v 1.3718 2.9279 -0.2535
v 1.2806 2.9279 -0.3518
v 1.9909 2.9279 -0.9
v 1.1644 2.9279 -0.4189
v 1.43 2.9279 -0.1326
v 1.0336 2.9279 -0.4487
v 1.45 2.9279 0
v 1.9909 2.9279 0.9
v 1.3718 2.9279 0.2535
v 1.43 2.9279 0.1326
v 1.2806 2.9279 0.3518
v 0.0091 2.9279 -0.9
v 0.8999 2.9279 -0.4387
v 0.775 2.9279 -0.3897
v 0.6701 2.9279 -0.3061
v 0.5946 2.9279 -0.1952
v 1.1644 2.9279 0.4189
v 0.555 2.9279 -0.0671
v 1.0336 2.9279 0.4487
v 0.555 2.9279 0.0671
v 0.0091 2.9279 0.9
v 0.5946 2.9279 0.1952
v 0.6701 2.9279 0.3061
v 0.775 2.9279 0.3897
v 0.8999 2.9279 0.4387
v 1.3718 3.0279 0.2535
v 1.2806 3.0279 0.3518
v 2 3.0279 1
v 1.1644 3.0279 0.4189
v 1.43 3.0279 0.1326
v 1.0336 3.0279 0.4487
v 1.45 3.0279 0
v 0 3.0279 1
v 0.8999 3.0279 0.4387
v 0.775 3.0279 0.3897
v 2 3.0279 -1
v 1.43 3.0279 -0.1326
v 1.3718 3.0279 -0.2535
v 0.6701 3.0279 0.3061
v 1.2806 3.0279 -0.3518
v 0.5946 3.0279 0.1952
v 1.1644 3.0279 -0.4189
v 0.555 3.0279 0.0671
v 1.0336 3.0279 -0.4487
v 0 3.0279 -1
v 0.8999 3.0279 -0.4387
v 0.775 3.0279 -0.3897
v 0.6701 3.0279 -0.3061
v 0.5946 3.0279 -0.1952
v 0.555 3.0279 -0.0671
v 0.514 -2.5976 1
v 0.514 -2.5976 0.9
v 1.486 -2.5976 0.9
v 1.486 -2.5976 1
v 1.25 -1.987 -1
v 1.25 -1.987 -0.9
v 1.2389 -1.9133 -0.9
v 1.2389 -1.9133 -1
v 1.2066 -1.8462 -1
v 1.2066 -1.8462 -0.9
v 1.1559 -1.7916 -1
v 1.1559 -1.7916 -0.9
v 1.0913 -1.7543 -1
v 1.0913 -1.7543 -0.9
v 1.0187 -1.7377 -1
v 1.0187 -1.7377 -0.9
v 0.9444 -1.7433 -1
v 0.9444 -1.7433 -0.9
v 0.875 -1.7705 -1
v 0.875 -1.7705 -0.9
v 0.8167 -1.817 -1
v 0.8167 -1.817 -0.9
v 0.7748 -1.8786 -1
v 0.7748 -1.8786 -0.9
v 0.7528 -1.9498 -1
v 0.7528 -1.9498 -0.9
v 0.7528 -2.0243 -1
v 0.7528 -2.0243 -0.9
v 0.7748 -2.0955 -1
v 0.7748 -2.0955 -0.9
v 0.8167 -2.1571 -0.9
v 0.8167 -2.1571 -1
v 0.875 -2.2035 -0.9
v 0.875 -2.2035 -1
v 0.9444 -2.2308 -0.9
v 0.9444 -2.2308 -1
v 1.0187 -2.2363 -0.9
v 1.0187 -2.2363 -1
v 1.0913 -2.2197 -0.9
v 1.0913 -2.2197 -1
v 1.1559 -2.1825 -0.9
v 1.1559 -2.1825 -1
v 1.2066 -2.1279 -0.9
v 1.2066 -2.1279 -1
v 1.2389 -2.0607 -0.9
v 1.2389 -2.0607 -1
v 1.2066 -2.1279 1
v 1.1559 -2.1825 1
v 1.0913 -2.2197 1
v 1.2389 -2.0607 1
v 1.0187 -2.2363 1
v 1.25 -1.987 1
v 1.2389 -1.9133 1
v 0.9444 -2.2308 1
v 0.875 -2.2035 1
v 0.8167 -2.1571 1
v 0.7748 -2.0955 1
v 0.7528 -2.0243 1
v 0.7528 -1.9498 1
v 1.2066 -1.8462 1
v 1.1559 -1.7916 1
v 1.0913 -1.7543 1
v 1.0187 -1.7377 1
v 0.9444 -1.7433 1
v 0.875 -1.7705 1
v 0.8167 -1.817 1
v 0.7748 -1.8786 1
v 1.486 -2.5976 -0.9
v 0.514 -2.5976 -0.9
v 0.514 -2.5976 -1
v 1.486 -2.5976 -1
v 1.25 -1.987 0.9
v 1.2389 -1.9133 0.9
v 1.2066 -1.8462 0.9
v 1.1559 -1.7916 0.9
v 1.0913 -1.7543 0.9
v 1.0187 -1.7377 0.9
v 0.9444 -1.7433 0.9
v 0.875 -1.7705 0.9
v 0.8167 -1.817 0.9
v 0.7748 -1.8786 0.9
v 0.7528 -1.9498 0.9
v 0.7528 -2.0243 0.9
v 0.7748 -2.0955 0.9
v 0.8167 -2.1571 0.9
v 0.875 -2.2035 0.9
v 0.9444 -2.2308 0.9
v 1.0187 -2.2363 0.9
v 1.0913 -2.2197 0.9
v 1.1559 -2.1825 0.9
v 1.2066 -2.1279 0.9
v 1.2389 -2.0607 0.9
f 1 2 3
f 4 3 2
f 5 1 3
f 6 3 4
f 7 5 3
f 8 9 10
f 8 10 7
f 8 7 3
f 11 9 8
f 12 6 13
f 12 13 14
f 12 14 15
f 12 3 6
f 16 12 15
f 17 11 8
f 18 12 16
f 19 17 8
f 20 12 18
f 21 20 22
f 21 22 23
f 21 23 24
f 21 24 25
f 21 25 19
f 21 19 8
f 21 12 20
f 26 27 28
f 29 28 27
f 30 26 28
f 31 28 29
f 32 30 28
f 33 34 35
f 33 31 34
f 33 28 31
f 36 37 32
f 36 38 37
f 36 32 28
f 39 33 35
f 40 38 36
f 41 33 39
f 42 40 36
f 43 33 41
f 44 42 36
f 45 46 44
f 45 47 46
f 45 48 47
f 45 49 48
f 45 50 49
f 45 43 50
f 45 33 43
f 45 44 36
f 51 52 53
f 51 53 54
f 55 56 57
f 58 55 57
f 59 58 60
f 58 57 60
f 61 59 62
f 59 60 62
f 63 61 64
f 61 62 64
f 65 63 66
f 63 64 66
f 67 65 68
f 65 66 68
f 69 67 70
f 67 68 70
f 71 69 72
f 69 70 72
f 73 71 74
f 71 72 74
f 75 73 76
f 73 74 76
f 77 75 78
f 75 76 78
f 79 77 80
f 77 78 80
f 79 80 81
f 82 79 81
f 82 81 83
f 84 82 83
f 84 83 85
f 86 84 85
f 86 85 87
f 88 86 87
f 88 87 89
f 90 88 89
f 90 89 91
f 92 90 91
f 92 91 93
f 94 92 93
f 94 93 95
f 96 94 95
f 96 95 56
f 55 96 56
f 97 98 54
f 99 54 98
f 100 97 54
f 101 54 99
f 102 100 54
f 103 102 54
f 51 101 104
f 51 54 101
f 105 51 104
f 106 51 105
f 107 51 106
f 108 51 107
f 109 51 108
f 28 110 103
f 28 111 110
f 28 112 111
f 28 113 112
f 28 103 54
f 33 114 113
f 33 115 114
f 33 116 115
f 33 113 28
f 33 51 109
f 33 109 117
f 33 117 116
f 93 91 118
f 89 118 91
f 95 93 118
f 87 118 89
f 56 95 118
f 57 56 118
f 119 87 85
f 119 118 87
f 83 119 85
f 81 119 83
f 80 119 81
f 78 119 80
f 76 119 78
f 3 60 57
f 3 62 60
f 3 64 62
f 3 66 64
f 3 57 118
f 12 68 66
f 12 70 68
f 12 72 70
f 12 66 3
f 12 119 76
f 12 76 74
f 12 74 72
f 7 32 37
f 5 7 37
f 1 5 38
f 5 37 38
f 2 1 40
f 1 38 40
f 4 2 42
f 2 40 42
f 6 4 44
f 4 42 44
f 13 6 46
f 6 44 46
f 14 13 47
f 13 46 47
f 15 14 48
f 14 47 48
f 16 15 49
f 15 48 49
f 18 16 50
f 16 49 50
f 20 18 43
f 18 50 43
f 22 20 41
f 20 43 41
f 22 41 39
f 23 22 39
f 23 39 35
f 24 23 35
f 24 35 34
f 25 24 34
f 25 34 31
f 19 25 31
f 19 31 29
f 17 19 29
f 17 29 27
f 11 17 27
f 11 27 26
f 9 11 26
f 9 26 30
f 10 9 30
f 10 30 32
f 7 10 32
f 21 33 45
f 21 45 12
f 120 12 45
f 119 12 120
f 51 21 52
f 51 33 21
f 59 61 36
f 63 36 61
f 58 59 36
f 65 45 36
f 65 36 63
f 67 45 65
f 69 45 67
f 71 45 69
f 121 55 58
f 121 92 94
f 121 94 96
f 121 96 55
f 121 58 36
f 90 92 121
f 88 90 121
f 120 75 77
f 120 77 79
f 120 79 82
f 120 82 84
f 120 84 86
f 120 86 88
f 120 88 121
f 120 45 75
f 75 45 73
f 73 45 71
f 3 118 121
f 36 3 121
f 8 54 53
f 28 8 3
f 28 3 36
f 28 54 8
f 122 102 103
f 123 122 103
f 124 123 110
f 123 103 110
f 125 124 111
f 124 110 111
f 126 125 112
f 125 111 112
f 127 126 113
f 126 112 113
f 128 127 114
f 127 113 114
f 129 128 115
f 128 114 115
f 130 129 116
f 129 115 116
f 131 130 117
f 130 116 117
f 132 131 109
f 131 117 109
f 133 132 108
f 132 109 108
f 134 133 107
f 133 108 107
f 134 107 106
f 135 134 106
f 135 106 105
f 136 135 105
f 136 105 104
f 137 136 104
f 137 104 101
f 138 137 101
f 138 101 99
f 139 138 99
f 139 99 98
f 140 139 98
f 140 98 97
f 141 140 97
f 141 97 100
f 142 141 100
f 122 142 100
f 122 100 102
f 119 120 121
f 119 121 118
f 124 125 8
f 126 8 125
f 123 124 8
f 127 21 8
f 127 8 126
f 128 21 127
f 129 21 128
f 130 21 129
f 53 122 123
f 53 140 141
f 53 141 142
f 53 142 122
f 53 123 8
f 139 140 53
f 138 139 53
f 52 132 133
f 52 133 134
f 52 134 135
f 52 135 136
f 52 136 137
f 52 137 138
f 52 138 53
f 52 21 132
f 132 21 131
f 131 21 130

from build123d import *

# Parameters (mm, degrees)
BOSS_EXTRUDE1_DEPTH = 2
CUT_EXTRUDE1_DEPTH  = 2
SKETCH3_R           = 0.25
CUT_EXTRUDE2_DEPTH  = 2
SKETCH4_R           = 0.45
CUT_EXTRUDE3_DEPTH  = 2


with BuildPart() as part:
    # Sketch1 → Boss-Extrude1 (new body)
    with BuildSketch(Plane(origin=(0, 0, 0), x_dir=(0, 0, -1), z_dir=(1, 0, 0))):
        Polygon((-0.9, -2.597609562), (-1, -2.597609562), (-1, 3.027888446), (1, 3.027888446), (1, -2.597609562), (0.9, -2.597609562), (0.9, 2.927888446), (-0.9, 2.927888446), align=None)
    extrude(amount=BOSS_EXTRUDE1_DEPTH)

    # Sketch2 → Cut-Extrude1 (cut)
    with BuildSketch(Plane.XY.offset(1)):
        Polygon((0, 3.027888446), (0.513981797, -2.597609562), (-0.357499118, -2.969117749), (-0.407776863, -2.389247755), align=None)
        Polygon((2.407776863, -2.389247755), (2.357499118, -2.969117749), (1.486018203, -2.597609562), (2, 3.027888446), align=None)
    extrude(amount=-CUT_EXTRUDE1_DEPTH, mode=Mode.SUBTRACT)

    # Sketch3 → Cut-Extrude2 (cut)
    with BuildSketch(Plane.XY.offset(1)):
        with Locations((1, -1.987025794)):
            Circle(SKETCH3_R)
    extrude(amount=-CUT_EXTRUDE2_DEPTH, mode=Mode.SUBTRACT)

    # Sketch4 → Cut-Extrude3 (cut)
    with BuildSketch(Plane(origin=(0, 3.027888446, 0), x_dir=(1, 0, 0), z_dir=(0, 1, 0))):
        with Locations((1, 0)):
            Circle(SKETCH4_R)
    extrude(amount=-CUT_EXTRUDE3_DEPTH, mode=Mode.SUBTRACT)


solid = part.part
